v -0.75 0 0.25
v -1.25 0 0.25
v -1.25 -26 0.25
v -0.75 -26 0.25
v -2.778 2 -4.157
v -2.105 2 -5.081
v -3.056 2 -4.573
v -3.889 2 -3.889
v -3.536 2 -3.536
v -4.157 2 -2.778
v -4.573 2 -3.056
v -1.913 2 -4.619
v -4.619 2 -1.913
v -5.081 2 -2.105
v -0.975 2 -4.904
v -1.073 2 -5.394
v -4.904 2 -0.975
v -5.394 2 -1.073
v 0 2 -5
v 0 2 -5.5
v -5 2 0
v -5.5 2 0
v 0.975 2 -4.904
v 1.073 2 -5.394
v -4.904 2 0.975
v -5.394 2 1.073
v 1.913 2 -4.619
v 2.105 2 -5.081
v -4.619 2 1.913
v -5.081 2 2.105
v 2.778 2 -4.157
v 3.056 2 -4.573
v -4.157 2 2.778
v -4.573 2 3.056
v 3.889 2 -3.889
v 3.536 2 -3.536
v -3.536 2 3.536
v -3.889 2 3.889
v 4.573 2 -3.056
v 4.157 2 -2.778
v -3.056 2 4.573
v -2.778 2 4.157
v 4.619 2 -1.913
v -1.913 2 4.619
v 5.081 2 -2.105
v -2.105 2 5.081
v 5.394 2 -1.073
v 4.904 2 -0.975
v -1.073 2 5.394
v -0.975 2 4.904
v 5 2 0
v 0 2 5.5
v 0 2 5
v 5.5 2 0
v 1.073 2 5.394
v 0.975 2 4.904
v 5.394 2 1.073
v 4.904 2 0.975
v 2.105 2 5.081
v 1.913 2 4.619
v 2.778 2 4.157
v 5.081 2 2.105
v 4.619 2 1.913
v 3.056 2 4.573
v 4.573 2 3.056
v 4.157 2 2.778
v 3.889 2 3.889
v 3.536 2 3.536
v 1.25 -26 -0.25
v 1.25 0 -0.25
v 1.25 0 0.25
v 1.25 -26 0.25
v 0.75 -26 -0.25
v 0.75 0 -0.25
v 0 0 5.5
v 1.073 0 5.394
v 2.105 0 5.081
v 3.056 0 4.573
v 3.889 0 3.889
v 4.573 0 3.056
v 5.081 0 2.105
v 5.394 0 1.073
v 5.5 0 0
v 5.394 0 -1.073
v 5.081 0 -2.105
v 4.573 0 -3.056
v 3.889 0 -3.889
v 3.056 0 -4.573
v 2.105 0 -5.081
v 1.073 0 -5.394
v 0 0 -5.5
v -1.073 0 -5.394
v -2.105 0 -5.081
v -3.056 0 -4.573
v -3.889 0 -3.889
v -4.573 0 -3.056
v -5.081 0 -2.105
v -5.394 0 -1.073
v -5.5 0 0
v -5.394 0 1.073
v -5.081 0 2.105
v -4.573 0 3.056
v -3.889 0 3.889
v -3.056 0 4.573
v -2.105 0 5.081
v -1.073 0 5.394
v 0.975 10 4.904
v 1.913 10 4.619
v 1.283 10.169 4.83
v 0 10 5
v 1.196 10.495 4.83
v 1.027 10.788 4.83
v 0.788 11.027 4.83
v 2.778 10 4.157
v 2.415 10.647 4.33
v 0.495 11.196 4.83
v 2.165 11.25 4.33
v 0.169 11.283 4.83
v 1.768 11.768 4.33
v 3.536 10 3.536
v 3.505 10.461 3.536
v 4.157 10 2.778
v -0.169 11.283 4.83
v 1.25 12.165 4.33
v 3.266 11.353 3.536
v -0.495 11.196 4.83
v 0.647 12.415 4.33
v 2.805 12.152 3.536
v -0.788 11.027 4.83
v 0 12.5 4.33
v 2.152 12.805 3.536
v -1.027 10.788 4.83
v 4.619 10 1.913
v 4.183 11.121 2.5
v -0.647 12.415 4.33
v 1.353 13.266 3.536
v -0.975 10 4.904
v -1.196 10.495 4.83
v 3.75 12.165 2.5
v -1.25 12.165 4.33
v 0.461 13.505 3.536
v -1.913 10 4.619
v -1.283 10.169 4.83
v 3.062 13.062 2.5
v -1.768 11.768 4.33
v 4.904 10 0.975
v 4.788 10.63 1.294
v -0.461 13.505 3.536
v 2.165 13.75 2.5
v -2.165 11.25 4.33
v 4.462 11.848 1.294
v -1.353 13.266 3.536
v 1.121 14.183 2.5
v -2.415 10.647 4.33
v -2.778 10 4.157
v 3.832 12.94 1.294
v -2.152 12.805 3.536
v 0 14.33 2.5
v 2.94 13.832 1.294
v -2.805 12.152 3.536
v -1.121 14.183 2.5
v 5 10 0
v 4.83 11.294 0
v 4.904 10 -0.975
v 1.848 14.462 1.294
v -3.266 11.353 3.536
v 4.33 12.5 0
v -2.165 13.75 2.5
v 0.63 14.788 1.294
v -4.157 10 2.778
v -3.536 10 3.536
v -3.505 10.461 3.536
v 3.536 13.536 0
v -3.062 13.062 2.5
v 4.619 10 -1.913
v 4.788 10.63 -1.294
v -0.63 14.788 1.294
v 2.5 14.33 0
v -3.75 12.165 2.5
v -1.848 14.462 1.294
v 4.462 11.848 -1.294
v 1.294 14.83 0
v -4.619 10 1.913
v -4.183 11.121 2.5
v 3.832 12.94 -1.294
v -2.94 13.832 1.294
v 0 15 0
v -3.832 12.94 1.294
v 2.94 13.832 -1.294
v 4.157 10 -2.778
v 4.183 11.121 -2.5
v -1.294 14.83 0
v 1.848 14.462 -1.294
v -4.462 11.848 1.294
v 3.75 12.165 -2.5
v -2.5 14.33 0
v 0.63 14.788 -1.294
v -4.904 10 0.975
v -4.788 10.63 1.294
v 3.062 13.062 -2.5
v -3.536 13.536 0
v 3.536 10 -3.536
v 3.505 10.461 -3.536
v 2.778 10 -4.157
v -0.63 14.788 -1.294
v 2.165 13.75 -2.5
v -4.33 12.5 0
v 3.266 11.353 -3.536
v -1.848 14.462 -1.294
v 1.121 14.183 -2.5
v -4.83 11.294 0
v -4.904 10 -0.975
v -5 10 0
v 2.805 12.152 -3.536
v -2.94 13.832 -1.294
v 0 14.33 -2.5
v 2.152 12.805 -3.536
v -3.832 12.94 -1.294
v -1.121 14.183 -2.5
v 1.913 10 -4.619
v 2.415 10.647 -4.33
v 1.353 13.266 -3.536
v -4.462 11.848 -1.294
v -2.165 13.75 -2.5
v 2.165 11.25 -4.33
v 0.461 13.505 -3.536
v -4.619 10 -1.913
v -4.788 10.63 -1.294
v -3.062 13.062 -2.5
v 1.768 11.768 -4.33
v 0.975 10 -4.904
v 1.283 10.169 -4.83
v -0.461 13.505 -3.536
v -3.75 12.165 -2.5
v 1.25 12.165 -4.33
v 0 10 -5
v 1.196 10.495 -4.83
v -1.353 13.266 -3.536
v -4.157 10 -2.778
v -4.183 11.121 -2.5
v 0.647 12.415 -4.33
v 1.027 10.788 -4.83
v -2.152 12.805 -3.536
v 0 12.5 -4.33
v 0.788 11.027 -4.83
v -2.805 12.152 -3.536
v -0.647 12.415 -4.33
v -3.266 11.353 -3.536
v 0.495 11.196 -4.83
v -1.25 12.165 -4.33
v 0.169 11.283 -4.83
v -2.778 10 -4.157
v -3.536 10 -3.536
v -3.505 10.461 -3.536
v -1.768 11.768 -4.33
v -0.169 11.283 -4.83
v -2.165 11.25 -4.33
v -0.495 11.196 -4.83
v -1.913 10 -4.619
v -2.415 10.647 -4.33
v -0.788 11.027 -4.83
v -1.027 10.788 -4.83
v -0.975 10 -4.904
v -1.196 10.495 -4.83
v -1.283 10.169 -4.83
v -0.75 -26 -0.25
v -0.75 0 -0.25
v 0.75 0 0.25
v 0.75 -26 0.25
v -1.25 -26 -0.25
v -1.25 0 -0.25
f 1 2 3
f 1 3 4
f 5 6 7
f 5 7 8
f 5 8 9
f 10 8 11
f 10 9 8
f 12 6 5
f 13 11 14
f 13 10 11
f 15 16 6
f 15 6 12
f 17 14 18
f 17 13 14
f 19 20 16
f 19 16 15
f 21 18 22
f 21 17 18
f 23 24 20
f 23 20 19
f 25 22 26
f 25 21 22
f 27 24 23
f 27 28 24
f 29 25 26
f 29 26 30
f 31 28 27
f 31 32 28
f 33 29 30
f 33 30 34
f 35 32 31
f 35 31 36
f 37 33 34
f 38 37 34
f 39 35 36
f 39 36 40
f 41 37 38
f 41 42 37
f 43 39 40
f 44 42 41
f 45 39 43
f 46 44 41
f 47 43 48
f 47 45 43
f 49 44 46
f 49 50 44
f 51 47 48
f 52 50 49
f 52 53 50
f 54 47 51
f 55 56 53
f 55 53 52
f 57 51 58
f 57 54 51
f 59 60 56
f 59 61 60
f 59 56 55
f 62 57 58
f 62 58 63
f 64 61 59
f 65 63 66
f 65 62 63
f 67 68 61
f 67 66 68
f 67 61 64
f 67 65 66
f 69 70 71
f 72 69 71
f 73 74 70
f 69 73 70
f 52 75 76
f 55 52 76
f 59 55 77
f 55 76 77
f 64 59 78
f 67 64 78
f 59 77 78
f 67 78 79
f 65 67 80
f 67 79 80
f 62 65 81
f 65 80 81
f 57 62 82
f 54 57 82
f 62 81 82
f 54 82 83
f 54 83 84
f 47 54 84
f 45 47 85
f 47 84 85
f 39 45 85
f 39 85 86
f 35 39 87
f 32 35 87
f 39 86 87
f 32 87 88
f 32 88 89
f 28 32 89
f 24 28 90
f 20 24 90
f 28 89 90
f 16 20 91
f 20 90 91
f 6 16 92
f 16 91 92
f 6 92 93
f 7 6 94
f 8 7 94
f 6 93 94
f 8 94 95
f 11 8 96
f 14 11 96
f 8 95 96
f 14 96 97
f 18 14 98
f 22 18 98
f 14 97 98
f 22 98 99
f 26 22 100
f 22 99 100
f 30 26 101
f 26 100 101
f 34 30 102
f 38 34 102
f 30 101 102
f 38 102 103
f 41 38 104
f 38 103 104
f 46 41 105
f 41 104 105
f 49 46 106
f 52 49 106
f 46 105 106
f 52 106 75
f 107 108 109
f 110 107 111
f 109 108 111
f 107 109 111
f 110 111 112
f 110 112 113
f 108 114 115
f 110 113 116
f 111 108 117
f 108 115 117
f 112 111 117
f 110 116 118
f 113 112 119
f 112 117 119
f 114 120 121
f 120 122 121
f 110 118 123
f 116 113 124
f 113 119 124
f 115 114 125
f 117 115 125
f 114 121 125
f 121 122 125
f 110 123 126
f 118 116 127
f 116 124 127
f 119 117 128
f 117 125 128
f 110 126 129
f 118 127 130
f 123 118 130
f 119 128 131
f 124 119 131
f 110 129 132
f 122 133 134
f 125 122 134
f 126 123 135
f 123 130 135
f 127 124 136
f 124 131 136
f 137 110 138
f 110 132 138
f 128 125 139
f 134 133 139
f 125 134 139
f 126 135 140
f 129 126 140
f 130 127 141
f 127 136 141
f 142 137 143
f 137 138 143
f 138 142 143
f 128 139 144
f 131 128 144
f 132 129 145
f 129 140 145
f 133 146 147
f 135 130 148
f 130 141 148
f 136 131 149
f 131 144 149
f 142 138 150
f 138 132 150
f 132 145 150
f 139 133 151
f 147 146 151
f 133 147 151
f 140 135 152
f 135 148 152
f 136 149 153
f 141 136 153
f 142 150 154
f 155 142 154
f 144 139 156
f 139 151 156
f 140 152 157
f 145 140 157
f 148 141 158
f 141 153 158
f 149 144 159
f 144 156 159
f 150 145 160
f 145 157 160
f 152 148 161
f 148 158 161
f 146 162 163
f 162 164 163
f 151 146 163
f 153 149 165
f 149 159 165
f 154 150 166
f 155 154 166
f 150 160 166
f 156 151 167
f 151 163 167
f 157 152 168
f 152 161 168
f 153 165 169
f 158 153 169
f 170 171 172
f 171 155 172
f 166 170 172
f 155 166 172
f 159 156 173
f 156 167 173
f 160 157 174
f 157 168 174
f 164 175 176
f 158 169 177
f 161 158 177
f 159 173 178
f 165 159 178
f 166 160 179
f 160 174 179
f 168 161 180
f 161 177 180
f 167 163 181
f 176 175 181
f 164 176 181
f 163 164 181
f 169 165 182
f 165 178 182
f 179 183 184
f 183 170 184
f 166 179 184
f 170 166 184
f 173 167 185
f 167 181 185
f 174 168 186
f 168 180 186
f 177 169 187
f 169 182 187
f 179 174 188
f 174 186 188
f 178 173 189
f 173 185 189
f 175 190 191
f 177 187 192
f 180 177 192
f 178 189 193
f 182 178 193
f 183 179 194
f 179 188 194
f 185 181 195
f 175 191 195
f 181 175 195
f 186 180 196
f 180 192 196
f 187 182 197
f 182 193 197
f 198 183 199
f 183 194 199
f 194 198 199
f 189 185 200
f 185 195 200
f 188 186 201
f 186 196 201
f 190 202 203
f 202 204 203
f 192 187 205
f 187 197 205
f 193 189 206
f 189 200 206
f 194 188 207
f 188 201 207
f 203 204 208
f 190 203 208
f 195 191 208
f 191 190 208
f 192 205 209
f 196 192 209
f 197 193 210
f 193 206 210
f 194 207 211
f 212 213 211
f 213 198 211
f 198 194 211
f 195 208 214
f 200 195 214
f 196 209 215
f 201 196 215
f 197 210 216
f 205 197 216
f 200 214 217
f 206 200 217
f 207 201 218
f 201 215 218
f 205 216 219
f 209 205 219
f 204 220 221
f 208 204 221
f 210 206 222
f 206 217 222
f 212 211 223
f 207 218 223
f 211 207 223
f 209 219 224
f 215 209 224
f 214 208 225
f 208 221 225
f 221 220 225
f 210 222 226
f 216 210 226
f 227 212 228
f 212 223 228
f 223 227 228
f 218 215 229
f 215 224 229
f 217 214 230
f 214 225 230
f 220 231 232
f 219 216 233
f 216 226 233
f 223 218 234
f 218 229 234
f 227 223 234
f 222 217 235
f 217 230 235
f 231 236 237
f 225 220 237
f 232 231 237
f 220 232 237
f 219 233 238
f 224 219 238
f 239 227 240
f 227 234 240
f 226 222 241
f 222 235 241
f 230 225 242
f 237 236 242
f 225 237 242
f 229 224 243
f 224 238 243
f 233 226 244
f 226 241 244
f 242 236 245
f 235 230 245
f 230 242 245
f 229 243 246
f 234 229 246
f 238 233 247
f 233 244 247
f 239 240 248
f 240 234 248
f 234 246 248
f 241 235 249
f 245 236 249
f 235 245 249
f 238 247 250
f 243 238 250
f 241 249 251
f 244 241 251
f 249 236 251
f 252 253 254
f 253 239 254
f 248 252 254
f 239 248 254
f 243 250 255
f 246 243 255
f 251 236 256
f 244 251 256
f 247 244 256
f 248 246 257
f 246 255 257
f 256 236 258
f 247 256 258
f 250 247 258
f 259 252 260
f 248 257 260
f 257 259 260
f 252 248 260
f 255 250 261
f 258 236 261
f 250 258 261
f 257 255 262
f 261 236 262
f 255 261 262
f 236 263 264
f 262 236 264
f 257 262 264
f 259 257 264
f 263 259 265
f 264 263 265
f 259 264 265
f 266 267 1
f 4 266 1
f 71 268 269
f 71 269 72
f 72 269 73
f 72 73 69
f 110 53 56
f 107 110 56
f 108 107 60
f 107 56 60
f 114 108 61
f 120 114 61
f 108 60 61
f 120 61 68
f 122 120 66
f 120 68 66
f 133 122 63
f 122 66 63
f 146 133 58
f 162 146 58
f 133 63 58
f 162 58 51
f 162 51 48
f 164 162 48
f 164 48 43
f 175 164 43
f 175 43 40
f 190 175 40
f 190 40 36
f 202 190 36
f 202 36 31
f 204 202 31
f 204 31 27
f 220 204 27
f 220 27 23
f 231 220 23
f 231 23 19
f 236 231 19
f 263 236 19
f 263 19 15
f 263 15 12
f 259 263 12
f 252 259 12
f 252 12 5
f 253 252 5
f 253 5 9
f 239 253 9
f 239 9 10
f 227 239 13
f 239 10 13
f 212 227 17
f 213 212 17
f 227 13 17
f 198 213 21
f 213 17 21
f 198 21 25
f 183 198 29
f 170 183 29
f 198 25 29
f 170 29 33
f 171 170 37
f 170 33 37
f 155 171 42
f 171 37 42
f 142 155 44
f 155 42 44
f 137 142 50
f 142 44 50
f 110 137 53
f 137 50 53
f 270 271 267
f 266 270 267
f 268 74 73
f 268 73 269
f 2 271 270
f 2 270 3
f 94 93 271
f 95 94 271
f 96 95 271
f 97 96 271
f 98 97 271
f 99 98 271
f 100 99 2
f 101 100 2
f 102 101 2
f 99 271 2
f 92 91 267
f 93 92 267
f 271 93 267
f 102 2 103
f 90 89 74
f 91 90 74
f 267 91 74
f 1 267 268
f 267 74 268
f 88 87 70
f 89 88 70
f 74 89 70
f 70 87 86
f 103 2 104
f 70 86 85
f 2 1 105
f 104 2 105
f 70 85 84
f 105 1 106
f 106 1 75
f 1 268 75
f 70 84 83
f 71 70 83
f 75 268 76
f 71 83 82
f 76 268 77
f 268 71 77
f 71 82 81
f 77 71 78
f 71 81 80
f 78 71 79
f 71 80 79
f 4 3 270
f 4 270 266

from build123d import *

# Parameters (mm, degrees)
SKETCH1_R           = 5.5
BOSS_EXTRUDE1_DEPTH = 2
SKETCH2_R           = 5
BOSS_EXTRUDE2_DEPTH = 8
REVOLVE1_ANGLE      = 180
SKETCH4_W           = 0.5
SKETCH4_H           = 0.5
BOSS_EXTRUDE3_DEPTH = 26


with BuildPart() as part:
    # Sketch1 → Boss-Extrude1 (new body)
    with BuildSketch(Plane(origin=(0, 0, 0), x_dir=(1, 0, 0), z_dir=(0, 1, 0))):
        with Locations(Location((0, 0, 0), (0, 0, 270))):
            Circle(SKETCH1_R)
    extrude(amount=BOSS_EXTRUDE1_DEPTH)

    # Sketch2 → Boss-Extrude2 (add)
    with BuildSketch(Plane(origin=(0, 2, 0), x_dir=(1, 0, 0), z_dir=(0, 1, 0))):
        with Locations(Location((0, 0, 0), (0, 0, 270))):
            Circle(SKETCH2_R)
    extrude(amount=BOSS_EXTRUDE2_DEPTH)

    # Sketch3 → Revolve1 (revolve)
    with BuildSketch(Plane(origin=(0, 10, 0), x_dir=(1, 0, 0), z_dir=(0, 1, 0))):
        with BuildLine():
            Line((0, 5), (0, -5))
            ThreePointArc((0, -5), (5, 0), (0, 5))
        make_face()
    revolve(axis=Axis((0, 10, -5), (0, 0, 1)), revolution_arc=REVOLVE1_ANGLE)

    # Sketch4 → Boss-Extrude3 (add)
    with BuildSketch(Plane.XZ):
        with Locations((-1, 0)):
            Rectangle(SKETCH4_W, SKETCH4_H)
        with Locations((1, 0)):
            Rectangle(SKETCH4_W, SKETCH4_H)
    extrude(amount=BOSS_EXTRUDE3_DEPTH)


solid = part.part
